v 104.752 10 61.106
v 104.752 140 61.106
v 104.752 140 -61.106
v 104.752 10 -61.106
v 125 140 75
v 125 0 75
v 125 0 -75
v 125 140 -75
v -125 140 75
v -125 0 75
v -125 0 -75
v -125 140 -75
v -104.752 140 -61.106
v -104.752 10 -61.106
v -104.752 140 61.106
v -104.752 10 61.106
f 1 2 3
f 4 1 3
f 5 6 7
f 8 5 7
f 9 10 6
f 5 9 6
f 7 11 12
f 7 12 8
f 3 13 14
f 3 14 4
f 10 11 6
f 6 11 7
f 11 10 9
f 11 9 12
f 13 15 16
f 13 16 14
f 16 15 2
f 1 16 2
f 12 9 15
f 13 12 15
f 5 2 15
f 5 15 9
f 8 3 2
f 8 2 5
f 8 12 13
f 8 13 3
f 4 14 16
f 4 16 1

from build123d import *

# Parameters (mm, degrees)
SKETCH1_W           = 250
SKETCH1_H           = 150
BOSS_EXTRUDE1_DEPTH = 140
SKETCH2_W           = 209.504921958
SKETCH2_H           = 122.211204476
CUT_EXTRUDE1_DEPTH  = 130


with BuildPart() as part:
    # Sketch1 → Boss-Extrude1 (new body)
    with BuildSketch(Plane(origin=(0, 0, 0), x_dir=(1, 0, 0), z_dir=(0, 1, 0))):
        Rectangle(SKETCH1_W, SKETCH1_H)
    extrude(amount=BOSS_EXTRUDE1_DEPTH)

    # Sketch2 → Cut-Extrude1 (cut)
    with BuildSketch(Plane(origin=(0, 140, 0), x_dir=(1, 0, 0), z_dir=(0, 1, 0))):
        Rectangle(SKETCH2_W, SKETCH2_H)
    extrude(amount=-CUT_EXTRUDE1_DEPTH, mode=Mode.SUBTRACT)


solid = part.part
